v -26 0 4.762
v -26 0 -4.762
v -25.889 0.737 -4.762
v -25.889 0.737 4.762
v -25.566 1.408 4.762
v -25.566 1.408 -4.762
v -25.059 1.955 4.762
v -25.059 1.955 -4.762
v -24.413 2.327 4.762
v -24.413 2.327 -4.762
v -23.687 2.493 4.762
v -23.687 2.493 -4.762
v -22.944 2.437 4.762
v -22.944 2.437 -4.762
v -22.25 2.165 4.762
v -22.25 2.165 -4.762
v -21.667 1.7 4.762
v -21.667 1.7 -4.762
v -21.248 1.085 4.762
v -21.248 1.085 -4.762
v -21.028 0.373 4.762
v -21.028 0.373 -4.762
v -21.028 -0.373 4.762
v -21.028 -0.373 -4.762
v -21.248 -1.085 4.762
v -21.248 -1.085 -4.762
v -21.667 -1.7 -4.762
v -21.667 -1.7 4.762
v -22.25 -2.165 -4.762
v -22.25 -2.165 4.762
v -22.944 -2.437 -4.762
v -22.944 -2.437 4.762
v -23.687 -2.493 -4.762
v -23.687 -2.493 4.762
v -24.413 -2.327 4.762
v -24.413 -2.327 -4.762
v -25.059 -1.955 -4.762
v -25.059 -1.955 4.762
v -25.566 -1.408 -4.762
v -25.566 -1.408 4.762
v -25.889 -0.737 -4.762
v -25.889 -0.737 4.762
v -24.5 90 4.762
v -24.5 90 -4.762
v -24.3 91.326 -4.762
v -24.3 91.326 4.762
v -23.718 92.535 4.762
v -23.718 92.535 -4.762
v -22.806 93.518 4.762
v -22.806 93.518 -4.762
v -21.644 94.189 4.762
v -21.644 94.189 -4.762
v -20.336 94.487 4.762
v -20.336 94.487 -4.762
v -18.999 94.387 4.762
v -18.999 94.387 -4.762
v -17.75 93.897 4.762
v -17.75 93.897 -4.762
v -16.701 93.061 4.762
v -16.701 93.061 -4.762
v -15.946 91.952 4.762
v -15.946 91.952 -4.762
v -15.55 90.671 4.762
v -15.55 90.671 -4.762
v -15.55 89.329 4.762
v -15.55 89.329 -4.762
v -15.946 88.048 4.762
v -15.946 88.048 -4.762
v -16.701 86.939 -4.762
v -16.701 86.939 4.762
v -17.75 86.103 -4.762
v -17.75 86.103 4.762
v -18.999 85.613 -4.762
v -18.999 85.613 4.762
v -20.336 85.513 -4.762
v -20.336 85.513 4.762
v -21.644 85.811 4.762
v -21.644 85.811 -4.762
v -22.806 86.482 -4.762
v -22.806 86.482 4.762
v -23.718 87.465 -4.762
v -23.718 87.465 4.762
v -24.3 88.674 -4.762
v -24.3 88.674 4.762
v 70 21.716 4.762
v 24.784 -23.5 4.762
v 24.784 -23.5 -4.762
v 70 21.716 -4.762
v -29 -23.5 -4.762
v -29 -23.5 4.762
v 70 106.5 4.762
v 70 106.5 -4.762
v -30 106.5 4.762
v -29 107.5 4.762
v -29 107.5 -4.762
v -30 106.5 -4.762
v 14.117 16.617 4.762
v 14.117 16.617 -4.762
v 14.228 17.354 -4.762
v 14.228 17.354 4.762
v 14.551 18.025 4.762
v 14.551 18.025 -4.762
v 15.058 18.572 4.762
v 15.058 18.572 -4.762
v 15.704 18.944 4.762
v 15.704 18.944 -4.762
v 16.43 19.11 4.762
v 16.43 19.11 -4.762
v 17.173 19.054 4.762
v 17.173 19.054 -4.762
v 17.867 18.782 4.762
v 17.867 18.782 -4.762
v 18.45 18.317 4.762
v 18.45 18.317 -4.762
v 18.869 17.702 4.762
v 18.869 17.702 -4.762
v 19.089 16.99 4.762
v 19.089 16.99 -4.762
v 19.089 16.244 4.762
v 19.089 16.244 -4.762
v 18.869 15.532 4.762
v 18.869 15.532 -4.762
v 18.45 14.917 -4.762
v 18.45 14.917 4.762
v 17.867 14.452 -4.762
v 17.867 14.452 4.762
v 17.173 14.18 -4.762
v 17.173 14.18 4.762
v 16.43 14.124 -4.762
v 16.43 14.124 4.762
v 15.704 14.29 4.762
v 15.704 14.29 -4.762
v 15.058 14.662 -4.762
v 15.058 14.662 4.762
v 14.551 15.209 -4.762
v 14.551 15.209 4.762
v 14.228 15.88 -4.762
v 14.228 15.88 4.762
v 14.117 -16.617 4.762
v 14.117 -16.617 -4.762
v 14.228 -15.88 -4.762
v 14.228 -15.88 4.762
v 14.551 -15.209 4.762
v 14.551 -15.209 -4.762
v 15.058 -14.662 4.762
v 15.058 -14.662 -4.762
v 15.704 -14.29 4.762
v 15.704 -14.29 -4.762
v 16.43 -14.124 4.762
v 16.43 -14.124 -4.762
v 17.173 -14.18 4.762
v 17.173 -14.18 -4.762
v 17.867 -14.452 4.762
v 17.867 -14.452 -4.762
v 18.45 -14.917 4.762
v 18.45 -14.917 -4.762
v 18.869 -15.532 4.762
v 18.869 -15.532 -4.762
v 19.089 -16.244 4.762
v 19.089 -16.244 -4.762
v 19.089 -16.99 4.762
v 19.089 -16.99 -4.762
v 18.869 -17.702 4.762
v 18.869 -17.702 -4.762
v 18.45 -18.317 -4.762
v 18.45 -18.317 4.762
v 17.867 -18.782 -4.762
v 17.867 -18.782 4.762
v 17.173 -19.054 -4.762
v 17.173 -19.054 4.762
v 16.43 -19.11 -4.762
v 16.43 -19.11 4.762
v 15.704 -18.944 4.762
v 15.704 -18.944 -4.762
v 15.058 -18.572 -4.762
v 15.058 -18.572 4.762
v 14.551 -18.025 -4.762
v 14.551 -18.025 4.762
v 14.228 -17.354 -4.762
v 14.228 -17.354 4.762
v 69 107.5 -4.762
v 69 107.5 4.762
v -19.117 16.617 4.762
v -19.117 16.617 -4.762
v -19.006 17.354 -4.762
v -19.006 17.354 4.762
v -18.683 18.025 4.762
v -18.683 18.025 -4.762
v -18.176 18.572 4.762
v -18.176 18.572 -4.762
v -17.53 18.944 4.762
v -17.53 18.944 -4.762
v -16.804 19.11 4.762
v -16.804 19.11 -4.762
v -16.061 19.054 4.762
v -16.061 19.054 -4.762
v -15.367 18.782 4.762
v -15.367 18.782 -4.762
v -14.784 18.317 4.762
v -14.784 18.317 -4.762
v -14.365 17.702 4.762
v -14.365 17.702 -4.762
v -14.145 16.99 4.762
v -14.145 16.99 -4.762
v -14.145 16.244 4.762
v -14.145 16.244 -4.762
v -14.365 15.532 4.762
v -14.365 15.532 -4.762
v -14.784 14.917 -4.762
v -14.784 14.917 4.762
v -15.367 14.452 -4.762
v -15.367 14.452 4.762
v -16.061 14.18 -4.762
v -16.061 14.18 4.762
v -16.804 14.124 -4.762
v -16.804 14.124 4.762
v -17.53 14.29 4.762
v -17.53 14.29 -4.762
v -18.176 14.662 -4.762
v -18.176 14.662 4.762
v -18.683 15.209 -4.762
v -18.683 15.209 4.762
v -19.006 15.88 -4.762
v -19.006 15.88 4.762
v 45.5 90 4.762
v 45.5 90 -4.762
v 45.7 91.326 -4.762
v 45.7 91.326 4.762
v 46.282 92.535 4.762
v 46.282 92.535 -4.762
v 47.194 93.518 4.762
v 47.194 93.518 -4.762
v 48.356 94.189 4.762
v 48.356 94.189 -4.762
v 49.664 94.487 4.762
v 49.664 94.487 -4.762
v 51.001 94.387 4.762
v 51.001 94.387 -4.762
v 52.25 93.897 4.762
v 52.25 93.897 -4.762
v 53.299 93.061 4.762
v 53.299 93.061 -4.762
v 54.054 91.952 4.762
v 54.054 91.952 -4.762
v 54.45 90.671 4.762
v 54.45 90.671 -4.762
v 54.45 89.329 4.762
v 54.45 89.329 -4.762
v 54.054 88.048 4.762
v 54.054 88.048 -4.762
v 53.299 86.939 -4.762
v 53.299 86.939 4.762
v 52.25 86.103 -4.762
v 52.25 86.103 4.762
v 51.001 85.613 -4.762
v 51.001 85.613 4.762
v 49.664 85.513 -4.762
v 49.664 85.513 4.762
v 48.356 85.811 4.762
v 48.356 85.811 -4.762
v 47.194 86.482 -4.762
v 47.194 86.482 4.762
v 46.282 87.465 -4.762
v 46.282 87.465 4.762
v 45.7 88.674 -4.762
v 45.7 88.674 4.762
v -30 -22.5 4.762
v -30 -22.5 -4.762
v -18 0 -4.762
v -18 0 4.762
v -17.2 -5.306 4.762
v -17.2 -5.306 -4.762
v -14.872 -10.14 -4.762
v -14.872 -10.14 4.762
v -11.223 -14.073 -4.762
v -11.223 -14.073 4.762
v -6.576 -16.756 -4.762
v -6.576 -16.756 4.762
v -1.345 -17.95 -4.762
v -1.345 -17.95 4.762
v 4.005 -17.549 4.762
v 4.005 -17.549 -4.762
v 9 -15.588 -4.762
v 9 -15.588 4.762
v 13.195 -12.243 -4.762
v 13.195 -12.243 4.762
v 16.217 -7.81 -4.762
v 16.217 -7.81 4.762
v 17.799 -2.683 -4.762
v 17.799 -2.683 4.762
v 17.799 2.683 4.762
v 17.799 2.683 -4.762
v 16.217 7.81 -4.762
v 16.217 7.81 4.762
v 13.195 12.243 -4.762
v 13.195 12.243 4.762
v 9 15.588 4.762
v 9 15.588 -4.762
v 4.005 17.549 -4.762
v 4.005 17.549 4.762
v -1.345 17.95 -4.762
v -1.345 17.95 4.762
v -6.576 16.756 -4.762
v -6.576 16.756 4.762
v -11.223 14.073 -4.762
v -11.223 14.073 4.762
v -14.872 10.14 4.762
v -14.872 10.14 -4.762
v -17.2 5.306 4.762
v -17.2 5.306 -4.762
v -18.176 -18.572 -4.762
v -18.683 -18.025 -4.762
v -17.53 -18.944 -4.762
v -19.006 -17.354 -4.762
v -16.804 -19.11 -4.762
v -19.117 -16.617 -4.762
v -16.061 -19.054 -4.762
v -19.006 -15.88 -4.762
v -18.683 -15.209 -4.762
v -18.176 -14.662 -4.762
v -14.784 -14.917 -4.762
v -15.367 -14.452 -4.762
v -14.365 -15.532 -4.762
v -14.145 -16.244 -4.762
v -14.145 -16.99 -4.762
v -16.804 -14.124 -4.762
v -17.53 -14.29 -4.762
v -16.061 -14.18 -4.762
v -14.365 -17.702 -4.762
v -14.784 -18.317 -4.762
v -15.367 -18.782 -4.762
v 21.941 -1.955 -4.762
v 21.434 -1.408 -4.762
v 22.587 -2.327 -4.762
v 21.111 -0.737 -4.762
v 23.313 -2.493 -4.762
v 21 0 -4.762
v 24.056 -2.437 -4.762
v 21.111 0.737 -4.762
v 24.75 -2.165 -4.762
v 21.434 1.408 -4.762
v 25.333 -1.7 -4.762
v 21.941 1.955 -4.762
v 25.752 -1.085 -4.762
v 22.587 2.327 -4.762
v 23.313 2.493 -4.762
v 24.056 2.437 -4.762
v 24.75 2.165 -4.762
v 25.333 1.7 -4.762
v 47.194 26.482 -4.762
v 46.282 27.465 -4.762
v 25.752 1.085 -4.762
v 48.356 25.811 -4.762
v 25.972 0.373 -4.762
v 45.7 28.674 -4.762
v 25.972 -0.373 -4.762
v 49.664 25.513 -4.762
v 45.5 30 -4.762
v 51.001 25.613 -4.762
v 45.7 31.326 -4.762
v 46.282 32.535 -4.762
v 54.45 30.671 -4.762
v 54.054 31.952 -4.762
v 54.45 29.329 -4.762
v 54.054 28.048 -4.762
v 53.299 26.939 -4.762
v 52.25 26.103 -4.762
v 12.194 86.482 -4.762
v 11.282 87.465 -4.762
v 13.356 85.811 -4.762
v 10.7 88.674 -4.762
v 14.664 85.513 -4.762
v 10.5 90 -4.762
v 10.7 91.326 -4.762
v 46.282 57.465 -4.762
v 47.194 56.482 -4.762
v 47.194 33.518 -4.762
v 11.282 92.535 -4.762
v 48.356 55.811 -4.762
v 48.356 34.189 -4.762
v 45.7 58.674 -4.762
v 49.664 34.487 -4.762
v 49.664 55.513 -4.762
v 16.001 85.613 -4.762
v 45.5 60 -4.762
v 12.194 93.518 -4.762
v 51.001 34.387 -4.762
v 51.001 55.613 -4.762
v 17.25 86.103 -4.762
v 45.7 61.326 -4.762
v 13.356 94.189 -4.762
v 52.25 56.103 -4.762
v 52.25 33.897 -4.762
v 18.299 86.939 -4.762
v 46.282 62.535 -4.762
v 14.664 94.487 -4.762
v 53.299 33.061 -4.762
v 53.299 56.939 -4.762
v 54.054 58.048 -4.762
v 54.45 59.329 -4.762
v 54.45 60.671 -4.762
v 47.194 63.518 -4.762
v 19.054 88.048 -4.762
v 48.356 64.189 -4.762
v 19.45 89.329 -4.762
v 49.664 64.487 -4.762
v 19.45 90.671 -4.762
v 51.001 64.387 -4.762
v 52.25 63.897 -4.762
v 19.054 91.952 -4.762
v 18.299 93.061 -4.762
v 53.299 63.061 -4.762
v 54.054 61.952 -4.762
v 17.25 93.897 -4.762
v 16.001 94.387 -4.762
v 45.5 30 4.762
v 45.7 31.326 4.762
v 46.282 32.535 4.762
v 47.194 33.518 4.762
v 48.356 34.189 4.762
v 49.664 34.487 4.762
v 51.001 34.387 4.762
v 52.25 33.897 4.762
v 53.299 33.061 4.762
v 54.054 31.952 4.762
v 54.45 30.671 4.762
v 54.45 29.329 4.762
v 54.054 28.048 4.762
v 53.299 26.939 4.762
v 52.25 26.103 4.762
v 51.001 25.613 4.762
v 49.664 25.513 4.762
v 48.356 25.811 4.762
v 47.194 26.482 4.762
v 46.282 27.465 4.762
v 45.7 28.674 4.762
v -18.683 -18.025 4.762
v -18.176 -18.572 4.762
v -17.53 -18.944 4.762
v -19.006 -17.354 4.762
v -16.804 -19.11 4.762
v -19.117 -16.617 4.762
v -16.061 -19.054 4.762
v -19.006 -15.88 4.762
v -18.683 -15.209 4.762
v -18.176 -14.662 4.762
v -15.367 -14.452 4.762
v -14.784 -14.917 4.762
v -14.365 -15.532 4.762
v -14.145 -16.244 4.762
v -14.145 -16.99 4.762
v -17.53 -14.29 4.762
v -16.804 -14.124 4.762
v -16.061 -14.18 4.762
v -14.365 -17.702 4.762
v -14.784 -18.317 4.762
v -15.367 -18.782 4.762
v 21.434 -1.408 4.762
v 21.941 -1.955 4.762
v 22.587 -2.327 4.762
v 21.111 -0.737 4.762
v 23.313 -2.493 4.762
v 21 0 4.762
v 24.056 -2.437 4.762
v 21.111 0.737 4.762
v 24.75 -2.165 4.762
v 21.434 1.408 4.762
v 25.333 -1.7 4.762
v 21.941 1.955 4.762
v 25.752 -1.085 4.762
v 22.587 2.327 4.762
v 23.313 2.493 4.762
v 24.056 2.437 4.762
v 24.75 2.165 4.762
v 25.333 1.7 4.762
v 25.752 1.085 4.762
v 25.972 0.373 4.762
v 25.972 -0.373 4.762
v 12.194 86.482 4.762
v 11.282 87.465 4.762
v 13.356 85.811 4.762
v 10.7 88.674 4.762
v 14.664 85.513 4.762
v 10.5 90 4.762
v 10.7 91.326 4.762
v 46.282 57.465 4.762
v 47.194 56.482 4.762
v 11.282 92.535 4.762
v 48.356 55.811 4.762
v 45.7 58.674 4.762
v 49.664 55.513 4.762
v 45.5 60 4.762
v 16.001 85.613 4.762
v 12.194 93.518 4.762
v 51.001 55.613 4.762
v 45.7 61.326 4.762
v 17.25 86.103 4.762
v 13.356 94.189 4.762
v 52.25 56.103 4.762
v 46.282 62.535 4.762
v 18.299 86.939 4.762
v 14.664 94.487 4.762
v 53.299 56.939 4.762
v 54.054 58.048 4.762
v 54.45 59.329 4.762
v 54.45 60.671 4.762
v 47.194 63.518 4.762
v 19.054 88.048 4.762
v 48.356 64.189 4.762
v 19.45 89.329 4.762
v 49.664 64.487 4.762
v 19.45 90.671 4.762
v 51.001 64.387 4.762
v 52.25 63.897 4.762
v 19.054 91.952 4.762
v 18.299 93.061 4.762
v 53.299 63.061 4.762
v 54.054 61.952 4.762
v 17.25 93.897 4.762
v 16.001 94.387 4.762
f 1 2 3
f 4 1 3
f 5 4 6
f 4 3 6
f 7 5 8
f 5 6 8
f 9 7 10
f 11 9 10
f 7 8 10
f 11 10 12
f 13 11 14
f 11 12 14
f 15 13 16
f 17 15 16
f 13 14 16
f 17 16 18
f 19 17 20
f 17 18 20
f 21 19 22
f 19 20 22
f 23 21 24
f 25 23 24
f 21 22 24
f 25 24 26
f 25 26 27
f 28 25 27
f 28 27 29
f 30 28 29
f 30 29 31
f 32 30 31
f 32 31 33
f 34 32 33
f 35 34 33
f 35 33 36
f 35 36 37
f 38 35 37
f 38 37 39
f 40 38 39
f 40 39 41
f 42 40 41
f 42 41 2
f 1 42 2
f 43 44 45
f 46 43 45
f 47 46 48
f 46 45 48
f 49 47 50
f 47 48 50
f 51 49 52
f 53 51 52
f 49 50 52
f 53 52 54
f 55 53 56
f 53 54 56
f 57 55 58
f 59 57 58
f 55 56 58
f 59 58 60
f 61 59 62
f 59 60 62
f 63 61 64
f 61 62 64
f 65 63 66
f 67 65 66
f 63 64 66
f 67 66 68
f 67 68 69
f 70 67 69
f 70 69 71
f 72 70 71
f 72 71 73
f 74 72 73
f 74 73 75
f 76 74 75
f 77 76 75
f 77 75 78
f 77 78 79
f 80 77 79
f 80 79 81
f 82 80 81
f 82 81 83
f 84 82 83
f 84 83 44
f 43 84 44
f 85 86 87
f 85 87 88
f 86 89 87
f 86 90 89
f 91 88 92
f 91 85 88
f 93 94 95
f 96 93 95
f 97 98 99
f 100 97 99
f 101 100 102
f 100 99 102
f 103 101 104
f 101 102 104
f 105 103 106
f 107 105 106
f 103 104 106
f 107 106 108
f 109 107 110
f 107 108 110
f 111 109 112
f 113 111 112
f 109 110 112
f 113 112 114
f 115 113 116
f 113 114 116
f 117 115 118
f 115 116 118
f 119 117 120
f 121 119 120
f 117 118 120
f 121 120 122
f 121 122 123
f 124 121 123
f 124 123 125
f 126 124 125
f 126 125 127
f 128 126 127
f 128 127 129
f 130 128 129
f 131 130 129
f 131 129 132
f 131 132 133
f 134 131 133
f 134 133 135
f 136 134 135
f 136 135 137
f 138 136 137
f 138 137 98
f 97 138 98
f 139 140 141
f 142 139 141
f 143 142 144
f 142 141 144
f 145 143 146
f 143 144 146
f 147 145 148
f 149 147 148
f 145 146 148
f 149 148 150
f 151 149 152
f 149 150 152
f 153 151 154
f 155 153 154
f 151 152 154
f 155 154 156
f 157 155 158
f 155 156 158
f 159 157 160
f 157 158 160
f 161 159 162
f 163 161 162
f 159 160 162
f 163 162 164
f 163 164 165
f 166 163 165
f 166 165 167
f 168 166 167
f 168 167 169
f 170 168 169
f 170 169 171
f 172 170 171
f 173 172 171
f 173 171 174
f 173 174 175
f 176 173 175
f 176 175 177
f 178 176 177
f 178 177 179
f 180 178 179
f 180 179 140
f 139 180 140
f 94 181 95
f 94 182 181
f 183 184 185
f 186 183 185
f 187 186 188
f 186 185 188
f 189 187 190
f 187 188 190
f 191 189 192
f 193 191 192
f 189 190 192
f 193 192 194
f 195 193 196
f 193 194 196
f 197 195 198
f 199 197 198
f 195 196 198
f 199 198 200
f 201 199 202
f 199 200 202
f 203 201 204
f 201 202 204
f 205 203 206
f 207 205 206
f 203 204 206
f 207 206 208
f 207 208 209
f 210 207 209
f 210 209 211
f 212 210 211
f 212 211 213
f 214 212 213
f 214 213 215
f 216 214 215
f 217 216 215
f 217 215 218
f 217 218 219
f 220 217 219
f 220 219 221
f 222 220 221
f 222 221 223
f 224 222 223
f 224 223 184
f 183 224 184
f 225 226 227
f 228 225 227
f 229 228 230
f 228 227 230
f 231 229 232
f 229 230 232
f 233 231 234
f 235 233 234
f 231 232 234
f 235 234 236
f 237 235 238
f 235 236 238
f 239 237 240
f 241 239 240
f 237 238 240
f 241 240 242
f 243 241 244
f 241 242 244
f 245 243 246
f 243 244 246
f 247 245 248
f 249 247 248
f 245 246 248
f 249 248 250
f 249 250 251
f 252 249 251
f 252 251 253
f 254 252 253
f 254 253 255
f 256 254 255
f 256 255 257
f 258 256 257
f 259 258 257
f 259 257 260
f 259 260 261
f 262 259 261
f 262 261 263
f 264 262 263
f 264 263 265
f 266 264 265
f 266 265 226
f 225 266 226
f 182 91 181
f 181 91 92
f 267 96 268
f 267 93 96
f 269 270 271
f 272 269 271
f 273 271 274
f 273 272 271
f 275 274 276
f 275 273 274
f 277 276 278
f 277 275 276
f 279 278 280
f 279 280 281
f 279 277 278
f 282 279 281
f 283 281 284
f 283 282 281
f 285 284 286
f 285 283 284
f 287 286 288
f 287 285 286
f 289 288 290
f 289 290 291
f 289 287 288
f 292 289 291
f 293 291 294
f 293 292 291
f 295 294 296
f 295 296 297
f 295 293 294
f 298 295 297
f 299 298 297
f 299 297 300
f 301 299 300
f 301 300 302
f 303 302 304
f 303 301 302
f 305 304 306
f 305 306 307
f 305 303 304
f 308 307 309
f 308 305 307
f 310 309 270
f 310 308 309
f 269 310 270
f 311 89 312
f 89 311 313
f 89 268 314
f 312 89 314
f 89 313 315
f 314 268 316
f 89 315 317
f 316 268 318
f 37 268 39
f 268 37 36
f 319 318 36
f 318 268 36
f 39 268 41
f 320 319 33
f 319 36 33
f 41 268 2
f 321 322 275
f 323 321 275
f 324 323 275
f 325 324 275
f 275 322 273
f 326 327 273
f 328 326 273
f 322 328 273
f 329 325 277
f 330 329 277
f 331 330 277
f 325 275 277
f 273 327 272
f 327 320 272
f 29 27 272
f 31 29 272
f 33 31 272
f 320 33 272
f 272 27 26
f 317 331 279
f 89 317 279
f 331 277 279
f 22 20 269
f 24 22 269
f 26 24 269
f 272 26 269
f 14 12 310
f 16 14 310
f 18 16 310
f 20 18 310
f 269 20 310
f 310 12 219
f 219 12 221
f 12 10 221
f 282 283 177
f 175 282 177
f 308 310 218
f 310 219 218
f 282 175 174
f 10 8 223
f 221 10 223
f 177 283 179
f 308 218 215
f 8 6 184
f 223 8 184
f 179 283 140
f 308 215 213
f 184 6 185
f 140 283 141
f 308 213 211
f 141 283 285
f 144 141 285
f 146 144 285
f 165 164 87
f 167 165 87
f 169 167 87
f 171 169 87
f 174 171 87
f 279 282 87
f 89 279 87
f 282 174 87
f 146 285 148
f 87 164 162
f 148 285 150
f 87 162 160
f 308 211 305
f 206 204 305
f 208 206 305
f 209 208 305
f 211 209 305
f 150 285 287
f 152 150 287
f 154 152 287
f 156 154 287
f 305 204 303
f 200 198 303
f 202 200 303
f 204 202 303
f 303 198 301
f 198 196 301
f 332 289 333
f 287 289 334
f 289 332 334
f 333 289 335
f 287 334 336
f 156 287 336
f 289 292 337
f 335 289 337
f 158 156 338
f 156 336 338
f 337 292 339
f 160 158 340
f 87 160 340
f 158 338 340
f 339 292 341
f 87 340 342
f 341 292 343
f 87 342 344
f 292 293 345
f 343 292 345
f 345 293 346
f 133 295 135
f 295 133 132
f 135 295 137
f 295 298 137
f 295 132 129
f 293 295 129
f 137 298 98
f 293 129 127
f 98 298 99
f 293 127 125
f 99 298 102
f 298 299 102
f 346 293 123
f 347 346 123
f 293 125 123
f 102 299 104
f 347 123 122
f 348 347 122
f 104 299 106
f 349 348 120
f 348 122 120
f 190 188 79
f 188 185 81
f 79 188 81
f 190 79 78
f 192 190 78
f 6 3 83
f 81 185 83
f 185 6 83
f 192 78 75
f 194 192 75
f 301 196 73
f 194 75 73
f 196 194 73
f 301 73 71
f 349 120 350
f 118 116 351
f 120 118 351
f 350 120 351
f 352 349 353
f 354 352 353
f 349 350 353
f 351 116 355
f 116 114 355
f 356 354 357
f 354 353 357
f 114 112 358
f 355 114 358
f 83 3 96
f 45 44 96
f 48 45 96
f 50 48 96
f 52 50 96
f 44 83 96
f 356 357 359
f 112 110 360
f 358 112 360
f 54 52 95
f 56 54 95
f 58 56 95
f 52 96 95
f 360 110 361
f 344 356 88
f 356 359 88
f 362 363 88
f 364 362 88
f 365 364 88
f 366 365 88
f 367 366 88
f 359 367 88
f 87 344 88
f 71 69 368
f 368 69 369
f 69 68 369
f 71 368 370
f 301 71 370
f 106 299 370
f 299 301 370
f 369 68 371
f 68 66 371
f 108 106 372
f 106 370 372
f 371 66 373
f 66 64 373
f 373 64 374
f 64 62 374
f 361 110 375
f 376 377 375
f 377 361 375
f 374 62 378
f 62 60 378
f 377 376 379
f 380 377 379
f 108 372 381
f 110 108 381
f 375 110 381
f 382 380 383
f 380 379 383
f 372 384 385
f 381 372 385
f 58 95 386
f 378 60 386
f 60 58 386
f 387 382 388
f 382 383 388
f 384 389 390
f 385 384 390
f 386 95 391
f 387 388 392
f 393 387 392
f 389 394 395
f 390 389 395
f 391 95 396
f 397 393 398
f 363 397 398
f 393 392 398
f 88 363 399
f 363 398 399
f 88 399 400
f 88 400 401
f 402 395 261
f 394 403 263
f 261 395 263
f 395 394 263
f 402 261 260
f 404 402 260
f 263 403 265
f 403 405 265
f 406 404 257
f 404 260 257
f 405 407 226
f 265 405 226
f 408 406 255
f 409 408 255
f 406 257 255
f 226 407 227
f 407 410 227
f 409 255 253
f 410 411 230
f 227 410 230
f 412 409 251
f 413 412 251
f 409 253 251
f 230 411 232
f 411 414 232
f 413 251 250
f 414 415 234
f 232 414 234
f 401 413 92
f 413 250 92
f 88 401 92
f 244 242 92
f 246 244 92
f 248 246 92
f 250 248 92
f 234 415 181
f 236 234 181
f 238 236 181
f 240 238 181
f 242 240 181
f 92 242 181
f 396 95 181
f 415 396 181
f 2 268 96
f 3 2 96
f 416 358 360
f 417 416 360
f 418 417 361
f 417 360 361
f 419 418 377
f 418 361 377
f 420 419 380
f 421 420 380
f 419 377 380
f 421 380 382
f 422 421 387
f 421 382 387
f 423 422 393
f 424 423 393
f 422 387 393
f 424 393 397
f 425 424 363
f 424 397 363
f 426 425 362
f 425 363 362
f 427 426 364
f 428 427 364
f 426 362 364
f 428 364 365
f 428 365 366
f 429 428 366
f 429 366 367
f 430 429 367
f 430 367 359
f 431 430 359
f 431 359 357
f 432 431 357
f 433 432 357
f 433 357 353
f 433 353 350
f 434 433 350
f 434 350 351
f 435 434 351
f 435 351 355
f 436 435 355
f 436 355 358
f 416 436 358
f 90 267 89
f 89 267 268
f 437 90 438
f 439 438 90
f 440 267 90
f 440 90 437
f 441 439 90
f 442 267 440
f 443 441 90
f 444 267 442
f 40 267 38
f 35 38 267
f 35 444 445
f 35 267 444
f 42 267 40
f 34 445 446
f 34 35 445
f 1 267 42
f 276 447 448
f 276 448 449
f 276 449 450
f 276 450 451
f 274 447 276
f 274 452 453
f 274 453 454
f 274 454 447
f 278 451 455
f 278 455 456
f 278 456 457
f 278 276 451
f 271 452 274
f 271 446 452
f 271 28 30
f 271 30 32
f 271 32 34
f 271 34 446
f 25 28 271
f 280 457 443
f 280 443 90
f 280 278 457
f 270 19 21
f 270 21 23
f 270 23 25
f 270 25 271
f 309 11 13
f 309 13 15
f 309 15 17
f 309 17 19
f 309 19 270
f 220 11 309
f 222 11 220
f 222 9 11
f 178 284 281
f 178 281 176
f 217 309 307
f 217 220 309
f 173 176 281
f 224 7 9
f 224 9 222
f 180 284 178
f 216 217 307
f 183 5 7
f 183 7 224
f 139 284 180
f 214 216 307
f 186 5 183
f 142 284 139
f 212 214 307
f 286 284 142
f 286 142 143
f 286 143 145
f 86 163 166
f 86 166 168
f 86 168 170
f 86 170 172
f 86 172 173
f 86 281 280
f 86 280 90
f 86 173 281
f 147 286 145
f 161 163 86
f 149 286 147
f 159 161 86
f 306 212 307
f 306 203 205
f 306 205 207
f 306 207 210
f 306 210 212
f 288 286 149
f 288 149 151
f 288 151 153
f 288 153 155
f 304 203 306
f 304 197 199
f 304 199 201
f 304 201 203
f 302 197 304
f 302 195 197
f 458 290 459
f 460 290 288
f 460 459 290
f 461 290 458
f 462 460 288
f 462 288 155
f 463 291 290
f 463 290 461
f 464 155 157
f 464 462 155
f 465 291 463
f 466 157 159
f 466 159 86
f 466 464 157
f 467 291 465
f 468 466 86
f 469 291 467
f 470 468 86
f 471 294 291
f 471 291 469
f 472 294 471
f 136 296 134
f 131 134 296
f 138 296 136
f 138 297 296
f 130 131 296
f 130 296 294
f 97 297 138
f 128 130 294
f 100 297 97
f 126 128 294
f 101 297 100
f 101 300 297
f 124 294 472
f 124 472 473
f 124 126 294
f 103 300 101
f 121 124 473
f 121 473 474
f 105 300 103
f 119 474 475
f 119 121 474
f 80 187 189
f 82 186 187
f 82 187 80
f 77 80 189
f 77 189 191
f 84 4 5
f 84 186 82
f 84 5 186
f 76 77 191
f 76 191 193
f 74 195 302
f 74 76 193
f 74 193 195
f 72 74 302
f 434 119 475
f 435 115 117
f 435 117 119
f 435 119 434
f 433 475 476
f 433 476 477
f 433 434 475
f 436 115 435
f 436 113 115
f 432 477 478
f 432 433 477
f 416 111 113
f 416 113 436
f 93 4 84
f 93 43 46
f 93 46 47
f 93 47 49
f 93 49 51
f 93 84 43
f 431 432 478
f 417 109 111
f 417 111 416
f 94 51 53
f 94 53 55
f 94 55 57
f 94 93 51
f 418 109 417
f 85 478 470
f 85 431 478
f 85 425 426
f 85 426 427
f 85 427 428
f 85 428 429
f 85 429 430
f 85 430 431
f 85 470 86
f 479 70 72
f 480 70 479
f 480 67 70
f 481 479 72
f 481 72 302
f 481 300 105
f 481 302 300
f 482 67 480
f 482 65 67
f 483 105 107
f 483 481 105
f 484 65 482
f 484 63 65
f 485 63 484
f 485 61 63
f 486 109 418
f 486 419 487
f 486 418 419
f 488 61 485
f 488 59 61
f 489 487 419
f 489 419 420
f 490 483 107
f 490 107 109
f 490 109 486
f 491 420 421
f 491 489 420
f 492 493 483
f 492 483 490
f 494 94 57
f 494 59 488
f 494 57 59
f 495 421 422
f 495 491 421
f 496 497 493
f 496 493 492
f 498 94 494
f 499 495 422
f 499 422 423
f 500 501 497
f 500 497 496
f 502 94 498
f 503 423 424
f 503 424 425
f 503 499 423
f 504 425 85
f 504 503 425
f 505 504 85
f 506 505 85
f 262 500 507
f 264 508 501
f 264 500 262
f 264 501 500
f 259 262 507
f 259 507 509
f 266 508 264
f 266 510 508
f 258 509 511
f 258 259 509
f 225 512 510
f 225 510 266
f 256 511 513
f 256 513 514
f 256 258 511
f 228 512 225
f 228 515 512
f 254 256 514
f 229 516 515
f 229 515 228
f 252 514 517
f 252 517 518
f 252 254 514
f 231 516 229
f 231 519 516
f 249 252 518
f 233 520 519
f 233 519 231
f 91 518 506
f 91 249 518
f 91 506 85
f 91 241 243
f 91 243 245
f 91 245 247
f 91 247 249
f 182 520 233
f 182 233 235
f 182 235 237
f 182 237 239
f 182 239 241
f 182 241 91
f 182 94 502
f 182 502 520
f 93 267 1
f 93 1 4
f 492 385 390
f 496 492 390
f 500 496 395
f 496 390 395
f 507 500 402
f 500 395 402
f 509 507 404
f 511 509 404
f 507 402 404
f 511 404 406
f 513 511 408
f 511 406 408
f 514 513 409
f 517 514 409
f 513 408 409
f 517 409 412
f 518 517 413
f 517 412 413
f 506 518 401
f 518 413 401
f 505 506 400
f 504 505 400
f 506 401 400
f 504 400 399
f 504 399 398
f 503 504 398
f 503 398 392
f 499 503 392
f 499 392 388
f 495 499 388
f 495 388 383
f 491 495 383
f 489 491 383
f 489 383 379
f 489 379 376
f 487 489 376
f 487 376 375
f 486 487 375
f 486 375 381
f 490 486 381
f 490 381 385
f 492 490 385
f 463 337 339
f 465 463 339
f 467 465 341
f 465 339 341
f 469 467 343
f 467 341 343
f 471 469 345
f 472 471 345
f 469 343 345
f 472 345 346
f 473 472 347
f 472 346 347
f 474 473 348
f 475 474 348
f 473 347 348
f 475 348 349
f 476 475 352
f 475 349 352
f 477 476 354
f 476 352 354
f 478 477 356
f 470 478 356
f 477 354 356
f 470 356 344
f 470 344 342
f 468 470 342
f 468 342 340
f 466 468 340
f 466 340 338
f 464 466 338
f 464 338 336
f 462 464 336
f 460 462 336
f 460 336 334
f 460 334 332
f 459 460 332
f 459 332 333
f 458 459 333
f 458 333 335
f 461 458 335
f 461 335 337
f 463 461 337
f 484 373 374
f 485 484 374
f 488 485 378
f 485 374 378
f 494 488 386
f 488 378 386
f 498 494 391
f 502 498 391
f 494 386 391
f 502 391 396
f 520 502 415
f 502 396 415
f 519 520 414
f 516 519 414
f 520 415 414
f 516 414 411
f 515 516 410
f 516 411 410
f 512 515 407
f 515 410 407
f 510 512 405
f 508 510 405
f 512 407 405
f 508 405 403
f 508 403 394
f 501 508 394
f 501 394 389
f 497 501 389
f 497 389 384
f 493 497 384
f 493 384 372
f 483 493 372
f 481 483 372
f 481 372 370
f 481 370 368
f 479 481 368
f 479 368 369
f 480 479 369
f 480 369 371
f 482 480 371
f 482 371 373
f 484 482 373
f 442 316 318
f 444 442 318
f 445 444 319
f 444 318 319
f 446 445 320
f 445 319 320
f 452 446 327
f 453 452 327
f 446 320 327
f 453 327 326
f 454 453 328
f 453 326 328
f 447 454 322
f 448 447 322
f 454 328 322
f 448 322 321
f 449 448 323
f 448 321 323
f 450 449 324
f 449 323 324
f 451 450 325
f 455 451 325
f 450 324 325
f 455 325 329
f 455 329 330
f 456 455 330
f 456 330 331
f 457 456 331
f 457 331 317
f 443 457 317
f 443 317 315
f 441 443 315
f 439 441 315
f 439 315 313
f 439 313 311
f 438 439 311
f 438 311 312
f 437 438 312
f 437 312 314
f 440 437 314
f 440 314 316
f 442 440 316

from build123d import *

# Parameters (mm, degrees)
SKETCH1_R             = 18
BOSS_EXTRUDE1_DEPTH   = 4.7625
M8_CLEARANCE_HOLE1_D  = 9
M6X1_0_TAPPED_HOLE1_D = 5
CHAMFER1_SIZE         = 1


with BuildPart() as part:
    # Sketch1 → Boss-Extrude1 (new, symmetric)
    with BuildSketch(Plane.XY):
        Polygon((-30, -23.5), (24.784271247, -23.5), (70, 21.715728753), (70, 107.5), (-30, 107.5), align=None)
        with Locations(Location((0, 0, 0), (0, 0, 180))):
            Circle(SKETCH1_R, mode=Mode.SUBTRACT)
    extrude(amount=BOSS_EXTRUDE1_DEPTH, both=True)

    # M8 Clearance Hole1 (through all)
    with Locations(Plane.XY.offset(4.7625)):
        with Locations((-20, 90), (15, 90), (50, 90), (50, 60), (50, 30)):
            Hole(M8_CLEARANCE_HOLE1_D / 2)

    # M6x1.0 Tapped Hole1 (through all)
    with Locations(Plane.XY.offset(4.7625)):
        with Locations((16.617009358, 16.617009358), (23.5, 0), (16.617009358, -16.617009358), (-16.617009358, -16.617009358), (-23.5, 0), (-16.617009358, 16.617009358)):
            Hole(M6X1_0_TAPPED_HOLE1_D / 2)

    # Chamfer1
    chamfer1_edges = [part.edges().sort_by_distance(p)[0] for p in [
        (-30, 107.5, 0),
        (70, 107.5, 0),
        (-30, -23.5, 0),
    ]]
    chamfer(chamfer1_edges, length=CHAMFER1_SIZE)


solid = part.part
